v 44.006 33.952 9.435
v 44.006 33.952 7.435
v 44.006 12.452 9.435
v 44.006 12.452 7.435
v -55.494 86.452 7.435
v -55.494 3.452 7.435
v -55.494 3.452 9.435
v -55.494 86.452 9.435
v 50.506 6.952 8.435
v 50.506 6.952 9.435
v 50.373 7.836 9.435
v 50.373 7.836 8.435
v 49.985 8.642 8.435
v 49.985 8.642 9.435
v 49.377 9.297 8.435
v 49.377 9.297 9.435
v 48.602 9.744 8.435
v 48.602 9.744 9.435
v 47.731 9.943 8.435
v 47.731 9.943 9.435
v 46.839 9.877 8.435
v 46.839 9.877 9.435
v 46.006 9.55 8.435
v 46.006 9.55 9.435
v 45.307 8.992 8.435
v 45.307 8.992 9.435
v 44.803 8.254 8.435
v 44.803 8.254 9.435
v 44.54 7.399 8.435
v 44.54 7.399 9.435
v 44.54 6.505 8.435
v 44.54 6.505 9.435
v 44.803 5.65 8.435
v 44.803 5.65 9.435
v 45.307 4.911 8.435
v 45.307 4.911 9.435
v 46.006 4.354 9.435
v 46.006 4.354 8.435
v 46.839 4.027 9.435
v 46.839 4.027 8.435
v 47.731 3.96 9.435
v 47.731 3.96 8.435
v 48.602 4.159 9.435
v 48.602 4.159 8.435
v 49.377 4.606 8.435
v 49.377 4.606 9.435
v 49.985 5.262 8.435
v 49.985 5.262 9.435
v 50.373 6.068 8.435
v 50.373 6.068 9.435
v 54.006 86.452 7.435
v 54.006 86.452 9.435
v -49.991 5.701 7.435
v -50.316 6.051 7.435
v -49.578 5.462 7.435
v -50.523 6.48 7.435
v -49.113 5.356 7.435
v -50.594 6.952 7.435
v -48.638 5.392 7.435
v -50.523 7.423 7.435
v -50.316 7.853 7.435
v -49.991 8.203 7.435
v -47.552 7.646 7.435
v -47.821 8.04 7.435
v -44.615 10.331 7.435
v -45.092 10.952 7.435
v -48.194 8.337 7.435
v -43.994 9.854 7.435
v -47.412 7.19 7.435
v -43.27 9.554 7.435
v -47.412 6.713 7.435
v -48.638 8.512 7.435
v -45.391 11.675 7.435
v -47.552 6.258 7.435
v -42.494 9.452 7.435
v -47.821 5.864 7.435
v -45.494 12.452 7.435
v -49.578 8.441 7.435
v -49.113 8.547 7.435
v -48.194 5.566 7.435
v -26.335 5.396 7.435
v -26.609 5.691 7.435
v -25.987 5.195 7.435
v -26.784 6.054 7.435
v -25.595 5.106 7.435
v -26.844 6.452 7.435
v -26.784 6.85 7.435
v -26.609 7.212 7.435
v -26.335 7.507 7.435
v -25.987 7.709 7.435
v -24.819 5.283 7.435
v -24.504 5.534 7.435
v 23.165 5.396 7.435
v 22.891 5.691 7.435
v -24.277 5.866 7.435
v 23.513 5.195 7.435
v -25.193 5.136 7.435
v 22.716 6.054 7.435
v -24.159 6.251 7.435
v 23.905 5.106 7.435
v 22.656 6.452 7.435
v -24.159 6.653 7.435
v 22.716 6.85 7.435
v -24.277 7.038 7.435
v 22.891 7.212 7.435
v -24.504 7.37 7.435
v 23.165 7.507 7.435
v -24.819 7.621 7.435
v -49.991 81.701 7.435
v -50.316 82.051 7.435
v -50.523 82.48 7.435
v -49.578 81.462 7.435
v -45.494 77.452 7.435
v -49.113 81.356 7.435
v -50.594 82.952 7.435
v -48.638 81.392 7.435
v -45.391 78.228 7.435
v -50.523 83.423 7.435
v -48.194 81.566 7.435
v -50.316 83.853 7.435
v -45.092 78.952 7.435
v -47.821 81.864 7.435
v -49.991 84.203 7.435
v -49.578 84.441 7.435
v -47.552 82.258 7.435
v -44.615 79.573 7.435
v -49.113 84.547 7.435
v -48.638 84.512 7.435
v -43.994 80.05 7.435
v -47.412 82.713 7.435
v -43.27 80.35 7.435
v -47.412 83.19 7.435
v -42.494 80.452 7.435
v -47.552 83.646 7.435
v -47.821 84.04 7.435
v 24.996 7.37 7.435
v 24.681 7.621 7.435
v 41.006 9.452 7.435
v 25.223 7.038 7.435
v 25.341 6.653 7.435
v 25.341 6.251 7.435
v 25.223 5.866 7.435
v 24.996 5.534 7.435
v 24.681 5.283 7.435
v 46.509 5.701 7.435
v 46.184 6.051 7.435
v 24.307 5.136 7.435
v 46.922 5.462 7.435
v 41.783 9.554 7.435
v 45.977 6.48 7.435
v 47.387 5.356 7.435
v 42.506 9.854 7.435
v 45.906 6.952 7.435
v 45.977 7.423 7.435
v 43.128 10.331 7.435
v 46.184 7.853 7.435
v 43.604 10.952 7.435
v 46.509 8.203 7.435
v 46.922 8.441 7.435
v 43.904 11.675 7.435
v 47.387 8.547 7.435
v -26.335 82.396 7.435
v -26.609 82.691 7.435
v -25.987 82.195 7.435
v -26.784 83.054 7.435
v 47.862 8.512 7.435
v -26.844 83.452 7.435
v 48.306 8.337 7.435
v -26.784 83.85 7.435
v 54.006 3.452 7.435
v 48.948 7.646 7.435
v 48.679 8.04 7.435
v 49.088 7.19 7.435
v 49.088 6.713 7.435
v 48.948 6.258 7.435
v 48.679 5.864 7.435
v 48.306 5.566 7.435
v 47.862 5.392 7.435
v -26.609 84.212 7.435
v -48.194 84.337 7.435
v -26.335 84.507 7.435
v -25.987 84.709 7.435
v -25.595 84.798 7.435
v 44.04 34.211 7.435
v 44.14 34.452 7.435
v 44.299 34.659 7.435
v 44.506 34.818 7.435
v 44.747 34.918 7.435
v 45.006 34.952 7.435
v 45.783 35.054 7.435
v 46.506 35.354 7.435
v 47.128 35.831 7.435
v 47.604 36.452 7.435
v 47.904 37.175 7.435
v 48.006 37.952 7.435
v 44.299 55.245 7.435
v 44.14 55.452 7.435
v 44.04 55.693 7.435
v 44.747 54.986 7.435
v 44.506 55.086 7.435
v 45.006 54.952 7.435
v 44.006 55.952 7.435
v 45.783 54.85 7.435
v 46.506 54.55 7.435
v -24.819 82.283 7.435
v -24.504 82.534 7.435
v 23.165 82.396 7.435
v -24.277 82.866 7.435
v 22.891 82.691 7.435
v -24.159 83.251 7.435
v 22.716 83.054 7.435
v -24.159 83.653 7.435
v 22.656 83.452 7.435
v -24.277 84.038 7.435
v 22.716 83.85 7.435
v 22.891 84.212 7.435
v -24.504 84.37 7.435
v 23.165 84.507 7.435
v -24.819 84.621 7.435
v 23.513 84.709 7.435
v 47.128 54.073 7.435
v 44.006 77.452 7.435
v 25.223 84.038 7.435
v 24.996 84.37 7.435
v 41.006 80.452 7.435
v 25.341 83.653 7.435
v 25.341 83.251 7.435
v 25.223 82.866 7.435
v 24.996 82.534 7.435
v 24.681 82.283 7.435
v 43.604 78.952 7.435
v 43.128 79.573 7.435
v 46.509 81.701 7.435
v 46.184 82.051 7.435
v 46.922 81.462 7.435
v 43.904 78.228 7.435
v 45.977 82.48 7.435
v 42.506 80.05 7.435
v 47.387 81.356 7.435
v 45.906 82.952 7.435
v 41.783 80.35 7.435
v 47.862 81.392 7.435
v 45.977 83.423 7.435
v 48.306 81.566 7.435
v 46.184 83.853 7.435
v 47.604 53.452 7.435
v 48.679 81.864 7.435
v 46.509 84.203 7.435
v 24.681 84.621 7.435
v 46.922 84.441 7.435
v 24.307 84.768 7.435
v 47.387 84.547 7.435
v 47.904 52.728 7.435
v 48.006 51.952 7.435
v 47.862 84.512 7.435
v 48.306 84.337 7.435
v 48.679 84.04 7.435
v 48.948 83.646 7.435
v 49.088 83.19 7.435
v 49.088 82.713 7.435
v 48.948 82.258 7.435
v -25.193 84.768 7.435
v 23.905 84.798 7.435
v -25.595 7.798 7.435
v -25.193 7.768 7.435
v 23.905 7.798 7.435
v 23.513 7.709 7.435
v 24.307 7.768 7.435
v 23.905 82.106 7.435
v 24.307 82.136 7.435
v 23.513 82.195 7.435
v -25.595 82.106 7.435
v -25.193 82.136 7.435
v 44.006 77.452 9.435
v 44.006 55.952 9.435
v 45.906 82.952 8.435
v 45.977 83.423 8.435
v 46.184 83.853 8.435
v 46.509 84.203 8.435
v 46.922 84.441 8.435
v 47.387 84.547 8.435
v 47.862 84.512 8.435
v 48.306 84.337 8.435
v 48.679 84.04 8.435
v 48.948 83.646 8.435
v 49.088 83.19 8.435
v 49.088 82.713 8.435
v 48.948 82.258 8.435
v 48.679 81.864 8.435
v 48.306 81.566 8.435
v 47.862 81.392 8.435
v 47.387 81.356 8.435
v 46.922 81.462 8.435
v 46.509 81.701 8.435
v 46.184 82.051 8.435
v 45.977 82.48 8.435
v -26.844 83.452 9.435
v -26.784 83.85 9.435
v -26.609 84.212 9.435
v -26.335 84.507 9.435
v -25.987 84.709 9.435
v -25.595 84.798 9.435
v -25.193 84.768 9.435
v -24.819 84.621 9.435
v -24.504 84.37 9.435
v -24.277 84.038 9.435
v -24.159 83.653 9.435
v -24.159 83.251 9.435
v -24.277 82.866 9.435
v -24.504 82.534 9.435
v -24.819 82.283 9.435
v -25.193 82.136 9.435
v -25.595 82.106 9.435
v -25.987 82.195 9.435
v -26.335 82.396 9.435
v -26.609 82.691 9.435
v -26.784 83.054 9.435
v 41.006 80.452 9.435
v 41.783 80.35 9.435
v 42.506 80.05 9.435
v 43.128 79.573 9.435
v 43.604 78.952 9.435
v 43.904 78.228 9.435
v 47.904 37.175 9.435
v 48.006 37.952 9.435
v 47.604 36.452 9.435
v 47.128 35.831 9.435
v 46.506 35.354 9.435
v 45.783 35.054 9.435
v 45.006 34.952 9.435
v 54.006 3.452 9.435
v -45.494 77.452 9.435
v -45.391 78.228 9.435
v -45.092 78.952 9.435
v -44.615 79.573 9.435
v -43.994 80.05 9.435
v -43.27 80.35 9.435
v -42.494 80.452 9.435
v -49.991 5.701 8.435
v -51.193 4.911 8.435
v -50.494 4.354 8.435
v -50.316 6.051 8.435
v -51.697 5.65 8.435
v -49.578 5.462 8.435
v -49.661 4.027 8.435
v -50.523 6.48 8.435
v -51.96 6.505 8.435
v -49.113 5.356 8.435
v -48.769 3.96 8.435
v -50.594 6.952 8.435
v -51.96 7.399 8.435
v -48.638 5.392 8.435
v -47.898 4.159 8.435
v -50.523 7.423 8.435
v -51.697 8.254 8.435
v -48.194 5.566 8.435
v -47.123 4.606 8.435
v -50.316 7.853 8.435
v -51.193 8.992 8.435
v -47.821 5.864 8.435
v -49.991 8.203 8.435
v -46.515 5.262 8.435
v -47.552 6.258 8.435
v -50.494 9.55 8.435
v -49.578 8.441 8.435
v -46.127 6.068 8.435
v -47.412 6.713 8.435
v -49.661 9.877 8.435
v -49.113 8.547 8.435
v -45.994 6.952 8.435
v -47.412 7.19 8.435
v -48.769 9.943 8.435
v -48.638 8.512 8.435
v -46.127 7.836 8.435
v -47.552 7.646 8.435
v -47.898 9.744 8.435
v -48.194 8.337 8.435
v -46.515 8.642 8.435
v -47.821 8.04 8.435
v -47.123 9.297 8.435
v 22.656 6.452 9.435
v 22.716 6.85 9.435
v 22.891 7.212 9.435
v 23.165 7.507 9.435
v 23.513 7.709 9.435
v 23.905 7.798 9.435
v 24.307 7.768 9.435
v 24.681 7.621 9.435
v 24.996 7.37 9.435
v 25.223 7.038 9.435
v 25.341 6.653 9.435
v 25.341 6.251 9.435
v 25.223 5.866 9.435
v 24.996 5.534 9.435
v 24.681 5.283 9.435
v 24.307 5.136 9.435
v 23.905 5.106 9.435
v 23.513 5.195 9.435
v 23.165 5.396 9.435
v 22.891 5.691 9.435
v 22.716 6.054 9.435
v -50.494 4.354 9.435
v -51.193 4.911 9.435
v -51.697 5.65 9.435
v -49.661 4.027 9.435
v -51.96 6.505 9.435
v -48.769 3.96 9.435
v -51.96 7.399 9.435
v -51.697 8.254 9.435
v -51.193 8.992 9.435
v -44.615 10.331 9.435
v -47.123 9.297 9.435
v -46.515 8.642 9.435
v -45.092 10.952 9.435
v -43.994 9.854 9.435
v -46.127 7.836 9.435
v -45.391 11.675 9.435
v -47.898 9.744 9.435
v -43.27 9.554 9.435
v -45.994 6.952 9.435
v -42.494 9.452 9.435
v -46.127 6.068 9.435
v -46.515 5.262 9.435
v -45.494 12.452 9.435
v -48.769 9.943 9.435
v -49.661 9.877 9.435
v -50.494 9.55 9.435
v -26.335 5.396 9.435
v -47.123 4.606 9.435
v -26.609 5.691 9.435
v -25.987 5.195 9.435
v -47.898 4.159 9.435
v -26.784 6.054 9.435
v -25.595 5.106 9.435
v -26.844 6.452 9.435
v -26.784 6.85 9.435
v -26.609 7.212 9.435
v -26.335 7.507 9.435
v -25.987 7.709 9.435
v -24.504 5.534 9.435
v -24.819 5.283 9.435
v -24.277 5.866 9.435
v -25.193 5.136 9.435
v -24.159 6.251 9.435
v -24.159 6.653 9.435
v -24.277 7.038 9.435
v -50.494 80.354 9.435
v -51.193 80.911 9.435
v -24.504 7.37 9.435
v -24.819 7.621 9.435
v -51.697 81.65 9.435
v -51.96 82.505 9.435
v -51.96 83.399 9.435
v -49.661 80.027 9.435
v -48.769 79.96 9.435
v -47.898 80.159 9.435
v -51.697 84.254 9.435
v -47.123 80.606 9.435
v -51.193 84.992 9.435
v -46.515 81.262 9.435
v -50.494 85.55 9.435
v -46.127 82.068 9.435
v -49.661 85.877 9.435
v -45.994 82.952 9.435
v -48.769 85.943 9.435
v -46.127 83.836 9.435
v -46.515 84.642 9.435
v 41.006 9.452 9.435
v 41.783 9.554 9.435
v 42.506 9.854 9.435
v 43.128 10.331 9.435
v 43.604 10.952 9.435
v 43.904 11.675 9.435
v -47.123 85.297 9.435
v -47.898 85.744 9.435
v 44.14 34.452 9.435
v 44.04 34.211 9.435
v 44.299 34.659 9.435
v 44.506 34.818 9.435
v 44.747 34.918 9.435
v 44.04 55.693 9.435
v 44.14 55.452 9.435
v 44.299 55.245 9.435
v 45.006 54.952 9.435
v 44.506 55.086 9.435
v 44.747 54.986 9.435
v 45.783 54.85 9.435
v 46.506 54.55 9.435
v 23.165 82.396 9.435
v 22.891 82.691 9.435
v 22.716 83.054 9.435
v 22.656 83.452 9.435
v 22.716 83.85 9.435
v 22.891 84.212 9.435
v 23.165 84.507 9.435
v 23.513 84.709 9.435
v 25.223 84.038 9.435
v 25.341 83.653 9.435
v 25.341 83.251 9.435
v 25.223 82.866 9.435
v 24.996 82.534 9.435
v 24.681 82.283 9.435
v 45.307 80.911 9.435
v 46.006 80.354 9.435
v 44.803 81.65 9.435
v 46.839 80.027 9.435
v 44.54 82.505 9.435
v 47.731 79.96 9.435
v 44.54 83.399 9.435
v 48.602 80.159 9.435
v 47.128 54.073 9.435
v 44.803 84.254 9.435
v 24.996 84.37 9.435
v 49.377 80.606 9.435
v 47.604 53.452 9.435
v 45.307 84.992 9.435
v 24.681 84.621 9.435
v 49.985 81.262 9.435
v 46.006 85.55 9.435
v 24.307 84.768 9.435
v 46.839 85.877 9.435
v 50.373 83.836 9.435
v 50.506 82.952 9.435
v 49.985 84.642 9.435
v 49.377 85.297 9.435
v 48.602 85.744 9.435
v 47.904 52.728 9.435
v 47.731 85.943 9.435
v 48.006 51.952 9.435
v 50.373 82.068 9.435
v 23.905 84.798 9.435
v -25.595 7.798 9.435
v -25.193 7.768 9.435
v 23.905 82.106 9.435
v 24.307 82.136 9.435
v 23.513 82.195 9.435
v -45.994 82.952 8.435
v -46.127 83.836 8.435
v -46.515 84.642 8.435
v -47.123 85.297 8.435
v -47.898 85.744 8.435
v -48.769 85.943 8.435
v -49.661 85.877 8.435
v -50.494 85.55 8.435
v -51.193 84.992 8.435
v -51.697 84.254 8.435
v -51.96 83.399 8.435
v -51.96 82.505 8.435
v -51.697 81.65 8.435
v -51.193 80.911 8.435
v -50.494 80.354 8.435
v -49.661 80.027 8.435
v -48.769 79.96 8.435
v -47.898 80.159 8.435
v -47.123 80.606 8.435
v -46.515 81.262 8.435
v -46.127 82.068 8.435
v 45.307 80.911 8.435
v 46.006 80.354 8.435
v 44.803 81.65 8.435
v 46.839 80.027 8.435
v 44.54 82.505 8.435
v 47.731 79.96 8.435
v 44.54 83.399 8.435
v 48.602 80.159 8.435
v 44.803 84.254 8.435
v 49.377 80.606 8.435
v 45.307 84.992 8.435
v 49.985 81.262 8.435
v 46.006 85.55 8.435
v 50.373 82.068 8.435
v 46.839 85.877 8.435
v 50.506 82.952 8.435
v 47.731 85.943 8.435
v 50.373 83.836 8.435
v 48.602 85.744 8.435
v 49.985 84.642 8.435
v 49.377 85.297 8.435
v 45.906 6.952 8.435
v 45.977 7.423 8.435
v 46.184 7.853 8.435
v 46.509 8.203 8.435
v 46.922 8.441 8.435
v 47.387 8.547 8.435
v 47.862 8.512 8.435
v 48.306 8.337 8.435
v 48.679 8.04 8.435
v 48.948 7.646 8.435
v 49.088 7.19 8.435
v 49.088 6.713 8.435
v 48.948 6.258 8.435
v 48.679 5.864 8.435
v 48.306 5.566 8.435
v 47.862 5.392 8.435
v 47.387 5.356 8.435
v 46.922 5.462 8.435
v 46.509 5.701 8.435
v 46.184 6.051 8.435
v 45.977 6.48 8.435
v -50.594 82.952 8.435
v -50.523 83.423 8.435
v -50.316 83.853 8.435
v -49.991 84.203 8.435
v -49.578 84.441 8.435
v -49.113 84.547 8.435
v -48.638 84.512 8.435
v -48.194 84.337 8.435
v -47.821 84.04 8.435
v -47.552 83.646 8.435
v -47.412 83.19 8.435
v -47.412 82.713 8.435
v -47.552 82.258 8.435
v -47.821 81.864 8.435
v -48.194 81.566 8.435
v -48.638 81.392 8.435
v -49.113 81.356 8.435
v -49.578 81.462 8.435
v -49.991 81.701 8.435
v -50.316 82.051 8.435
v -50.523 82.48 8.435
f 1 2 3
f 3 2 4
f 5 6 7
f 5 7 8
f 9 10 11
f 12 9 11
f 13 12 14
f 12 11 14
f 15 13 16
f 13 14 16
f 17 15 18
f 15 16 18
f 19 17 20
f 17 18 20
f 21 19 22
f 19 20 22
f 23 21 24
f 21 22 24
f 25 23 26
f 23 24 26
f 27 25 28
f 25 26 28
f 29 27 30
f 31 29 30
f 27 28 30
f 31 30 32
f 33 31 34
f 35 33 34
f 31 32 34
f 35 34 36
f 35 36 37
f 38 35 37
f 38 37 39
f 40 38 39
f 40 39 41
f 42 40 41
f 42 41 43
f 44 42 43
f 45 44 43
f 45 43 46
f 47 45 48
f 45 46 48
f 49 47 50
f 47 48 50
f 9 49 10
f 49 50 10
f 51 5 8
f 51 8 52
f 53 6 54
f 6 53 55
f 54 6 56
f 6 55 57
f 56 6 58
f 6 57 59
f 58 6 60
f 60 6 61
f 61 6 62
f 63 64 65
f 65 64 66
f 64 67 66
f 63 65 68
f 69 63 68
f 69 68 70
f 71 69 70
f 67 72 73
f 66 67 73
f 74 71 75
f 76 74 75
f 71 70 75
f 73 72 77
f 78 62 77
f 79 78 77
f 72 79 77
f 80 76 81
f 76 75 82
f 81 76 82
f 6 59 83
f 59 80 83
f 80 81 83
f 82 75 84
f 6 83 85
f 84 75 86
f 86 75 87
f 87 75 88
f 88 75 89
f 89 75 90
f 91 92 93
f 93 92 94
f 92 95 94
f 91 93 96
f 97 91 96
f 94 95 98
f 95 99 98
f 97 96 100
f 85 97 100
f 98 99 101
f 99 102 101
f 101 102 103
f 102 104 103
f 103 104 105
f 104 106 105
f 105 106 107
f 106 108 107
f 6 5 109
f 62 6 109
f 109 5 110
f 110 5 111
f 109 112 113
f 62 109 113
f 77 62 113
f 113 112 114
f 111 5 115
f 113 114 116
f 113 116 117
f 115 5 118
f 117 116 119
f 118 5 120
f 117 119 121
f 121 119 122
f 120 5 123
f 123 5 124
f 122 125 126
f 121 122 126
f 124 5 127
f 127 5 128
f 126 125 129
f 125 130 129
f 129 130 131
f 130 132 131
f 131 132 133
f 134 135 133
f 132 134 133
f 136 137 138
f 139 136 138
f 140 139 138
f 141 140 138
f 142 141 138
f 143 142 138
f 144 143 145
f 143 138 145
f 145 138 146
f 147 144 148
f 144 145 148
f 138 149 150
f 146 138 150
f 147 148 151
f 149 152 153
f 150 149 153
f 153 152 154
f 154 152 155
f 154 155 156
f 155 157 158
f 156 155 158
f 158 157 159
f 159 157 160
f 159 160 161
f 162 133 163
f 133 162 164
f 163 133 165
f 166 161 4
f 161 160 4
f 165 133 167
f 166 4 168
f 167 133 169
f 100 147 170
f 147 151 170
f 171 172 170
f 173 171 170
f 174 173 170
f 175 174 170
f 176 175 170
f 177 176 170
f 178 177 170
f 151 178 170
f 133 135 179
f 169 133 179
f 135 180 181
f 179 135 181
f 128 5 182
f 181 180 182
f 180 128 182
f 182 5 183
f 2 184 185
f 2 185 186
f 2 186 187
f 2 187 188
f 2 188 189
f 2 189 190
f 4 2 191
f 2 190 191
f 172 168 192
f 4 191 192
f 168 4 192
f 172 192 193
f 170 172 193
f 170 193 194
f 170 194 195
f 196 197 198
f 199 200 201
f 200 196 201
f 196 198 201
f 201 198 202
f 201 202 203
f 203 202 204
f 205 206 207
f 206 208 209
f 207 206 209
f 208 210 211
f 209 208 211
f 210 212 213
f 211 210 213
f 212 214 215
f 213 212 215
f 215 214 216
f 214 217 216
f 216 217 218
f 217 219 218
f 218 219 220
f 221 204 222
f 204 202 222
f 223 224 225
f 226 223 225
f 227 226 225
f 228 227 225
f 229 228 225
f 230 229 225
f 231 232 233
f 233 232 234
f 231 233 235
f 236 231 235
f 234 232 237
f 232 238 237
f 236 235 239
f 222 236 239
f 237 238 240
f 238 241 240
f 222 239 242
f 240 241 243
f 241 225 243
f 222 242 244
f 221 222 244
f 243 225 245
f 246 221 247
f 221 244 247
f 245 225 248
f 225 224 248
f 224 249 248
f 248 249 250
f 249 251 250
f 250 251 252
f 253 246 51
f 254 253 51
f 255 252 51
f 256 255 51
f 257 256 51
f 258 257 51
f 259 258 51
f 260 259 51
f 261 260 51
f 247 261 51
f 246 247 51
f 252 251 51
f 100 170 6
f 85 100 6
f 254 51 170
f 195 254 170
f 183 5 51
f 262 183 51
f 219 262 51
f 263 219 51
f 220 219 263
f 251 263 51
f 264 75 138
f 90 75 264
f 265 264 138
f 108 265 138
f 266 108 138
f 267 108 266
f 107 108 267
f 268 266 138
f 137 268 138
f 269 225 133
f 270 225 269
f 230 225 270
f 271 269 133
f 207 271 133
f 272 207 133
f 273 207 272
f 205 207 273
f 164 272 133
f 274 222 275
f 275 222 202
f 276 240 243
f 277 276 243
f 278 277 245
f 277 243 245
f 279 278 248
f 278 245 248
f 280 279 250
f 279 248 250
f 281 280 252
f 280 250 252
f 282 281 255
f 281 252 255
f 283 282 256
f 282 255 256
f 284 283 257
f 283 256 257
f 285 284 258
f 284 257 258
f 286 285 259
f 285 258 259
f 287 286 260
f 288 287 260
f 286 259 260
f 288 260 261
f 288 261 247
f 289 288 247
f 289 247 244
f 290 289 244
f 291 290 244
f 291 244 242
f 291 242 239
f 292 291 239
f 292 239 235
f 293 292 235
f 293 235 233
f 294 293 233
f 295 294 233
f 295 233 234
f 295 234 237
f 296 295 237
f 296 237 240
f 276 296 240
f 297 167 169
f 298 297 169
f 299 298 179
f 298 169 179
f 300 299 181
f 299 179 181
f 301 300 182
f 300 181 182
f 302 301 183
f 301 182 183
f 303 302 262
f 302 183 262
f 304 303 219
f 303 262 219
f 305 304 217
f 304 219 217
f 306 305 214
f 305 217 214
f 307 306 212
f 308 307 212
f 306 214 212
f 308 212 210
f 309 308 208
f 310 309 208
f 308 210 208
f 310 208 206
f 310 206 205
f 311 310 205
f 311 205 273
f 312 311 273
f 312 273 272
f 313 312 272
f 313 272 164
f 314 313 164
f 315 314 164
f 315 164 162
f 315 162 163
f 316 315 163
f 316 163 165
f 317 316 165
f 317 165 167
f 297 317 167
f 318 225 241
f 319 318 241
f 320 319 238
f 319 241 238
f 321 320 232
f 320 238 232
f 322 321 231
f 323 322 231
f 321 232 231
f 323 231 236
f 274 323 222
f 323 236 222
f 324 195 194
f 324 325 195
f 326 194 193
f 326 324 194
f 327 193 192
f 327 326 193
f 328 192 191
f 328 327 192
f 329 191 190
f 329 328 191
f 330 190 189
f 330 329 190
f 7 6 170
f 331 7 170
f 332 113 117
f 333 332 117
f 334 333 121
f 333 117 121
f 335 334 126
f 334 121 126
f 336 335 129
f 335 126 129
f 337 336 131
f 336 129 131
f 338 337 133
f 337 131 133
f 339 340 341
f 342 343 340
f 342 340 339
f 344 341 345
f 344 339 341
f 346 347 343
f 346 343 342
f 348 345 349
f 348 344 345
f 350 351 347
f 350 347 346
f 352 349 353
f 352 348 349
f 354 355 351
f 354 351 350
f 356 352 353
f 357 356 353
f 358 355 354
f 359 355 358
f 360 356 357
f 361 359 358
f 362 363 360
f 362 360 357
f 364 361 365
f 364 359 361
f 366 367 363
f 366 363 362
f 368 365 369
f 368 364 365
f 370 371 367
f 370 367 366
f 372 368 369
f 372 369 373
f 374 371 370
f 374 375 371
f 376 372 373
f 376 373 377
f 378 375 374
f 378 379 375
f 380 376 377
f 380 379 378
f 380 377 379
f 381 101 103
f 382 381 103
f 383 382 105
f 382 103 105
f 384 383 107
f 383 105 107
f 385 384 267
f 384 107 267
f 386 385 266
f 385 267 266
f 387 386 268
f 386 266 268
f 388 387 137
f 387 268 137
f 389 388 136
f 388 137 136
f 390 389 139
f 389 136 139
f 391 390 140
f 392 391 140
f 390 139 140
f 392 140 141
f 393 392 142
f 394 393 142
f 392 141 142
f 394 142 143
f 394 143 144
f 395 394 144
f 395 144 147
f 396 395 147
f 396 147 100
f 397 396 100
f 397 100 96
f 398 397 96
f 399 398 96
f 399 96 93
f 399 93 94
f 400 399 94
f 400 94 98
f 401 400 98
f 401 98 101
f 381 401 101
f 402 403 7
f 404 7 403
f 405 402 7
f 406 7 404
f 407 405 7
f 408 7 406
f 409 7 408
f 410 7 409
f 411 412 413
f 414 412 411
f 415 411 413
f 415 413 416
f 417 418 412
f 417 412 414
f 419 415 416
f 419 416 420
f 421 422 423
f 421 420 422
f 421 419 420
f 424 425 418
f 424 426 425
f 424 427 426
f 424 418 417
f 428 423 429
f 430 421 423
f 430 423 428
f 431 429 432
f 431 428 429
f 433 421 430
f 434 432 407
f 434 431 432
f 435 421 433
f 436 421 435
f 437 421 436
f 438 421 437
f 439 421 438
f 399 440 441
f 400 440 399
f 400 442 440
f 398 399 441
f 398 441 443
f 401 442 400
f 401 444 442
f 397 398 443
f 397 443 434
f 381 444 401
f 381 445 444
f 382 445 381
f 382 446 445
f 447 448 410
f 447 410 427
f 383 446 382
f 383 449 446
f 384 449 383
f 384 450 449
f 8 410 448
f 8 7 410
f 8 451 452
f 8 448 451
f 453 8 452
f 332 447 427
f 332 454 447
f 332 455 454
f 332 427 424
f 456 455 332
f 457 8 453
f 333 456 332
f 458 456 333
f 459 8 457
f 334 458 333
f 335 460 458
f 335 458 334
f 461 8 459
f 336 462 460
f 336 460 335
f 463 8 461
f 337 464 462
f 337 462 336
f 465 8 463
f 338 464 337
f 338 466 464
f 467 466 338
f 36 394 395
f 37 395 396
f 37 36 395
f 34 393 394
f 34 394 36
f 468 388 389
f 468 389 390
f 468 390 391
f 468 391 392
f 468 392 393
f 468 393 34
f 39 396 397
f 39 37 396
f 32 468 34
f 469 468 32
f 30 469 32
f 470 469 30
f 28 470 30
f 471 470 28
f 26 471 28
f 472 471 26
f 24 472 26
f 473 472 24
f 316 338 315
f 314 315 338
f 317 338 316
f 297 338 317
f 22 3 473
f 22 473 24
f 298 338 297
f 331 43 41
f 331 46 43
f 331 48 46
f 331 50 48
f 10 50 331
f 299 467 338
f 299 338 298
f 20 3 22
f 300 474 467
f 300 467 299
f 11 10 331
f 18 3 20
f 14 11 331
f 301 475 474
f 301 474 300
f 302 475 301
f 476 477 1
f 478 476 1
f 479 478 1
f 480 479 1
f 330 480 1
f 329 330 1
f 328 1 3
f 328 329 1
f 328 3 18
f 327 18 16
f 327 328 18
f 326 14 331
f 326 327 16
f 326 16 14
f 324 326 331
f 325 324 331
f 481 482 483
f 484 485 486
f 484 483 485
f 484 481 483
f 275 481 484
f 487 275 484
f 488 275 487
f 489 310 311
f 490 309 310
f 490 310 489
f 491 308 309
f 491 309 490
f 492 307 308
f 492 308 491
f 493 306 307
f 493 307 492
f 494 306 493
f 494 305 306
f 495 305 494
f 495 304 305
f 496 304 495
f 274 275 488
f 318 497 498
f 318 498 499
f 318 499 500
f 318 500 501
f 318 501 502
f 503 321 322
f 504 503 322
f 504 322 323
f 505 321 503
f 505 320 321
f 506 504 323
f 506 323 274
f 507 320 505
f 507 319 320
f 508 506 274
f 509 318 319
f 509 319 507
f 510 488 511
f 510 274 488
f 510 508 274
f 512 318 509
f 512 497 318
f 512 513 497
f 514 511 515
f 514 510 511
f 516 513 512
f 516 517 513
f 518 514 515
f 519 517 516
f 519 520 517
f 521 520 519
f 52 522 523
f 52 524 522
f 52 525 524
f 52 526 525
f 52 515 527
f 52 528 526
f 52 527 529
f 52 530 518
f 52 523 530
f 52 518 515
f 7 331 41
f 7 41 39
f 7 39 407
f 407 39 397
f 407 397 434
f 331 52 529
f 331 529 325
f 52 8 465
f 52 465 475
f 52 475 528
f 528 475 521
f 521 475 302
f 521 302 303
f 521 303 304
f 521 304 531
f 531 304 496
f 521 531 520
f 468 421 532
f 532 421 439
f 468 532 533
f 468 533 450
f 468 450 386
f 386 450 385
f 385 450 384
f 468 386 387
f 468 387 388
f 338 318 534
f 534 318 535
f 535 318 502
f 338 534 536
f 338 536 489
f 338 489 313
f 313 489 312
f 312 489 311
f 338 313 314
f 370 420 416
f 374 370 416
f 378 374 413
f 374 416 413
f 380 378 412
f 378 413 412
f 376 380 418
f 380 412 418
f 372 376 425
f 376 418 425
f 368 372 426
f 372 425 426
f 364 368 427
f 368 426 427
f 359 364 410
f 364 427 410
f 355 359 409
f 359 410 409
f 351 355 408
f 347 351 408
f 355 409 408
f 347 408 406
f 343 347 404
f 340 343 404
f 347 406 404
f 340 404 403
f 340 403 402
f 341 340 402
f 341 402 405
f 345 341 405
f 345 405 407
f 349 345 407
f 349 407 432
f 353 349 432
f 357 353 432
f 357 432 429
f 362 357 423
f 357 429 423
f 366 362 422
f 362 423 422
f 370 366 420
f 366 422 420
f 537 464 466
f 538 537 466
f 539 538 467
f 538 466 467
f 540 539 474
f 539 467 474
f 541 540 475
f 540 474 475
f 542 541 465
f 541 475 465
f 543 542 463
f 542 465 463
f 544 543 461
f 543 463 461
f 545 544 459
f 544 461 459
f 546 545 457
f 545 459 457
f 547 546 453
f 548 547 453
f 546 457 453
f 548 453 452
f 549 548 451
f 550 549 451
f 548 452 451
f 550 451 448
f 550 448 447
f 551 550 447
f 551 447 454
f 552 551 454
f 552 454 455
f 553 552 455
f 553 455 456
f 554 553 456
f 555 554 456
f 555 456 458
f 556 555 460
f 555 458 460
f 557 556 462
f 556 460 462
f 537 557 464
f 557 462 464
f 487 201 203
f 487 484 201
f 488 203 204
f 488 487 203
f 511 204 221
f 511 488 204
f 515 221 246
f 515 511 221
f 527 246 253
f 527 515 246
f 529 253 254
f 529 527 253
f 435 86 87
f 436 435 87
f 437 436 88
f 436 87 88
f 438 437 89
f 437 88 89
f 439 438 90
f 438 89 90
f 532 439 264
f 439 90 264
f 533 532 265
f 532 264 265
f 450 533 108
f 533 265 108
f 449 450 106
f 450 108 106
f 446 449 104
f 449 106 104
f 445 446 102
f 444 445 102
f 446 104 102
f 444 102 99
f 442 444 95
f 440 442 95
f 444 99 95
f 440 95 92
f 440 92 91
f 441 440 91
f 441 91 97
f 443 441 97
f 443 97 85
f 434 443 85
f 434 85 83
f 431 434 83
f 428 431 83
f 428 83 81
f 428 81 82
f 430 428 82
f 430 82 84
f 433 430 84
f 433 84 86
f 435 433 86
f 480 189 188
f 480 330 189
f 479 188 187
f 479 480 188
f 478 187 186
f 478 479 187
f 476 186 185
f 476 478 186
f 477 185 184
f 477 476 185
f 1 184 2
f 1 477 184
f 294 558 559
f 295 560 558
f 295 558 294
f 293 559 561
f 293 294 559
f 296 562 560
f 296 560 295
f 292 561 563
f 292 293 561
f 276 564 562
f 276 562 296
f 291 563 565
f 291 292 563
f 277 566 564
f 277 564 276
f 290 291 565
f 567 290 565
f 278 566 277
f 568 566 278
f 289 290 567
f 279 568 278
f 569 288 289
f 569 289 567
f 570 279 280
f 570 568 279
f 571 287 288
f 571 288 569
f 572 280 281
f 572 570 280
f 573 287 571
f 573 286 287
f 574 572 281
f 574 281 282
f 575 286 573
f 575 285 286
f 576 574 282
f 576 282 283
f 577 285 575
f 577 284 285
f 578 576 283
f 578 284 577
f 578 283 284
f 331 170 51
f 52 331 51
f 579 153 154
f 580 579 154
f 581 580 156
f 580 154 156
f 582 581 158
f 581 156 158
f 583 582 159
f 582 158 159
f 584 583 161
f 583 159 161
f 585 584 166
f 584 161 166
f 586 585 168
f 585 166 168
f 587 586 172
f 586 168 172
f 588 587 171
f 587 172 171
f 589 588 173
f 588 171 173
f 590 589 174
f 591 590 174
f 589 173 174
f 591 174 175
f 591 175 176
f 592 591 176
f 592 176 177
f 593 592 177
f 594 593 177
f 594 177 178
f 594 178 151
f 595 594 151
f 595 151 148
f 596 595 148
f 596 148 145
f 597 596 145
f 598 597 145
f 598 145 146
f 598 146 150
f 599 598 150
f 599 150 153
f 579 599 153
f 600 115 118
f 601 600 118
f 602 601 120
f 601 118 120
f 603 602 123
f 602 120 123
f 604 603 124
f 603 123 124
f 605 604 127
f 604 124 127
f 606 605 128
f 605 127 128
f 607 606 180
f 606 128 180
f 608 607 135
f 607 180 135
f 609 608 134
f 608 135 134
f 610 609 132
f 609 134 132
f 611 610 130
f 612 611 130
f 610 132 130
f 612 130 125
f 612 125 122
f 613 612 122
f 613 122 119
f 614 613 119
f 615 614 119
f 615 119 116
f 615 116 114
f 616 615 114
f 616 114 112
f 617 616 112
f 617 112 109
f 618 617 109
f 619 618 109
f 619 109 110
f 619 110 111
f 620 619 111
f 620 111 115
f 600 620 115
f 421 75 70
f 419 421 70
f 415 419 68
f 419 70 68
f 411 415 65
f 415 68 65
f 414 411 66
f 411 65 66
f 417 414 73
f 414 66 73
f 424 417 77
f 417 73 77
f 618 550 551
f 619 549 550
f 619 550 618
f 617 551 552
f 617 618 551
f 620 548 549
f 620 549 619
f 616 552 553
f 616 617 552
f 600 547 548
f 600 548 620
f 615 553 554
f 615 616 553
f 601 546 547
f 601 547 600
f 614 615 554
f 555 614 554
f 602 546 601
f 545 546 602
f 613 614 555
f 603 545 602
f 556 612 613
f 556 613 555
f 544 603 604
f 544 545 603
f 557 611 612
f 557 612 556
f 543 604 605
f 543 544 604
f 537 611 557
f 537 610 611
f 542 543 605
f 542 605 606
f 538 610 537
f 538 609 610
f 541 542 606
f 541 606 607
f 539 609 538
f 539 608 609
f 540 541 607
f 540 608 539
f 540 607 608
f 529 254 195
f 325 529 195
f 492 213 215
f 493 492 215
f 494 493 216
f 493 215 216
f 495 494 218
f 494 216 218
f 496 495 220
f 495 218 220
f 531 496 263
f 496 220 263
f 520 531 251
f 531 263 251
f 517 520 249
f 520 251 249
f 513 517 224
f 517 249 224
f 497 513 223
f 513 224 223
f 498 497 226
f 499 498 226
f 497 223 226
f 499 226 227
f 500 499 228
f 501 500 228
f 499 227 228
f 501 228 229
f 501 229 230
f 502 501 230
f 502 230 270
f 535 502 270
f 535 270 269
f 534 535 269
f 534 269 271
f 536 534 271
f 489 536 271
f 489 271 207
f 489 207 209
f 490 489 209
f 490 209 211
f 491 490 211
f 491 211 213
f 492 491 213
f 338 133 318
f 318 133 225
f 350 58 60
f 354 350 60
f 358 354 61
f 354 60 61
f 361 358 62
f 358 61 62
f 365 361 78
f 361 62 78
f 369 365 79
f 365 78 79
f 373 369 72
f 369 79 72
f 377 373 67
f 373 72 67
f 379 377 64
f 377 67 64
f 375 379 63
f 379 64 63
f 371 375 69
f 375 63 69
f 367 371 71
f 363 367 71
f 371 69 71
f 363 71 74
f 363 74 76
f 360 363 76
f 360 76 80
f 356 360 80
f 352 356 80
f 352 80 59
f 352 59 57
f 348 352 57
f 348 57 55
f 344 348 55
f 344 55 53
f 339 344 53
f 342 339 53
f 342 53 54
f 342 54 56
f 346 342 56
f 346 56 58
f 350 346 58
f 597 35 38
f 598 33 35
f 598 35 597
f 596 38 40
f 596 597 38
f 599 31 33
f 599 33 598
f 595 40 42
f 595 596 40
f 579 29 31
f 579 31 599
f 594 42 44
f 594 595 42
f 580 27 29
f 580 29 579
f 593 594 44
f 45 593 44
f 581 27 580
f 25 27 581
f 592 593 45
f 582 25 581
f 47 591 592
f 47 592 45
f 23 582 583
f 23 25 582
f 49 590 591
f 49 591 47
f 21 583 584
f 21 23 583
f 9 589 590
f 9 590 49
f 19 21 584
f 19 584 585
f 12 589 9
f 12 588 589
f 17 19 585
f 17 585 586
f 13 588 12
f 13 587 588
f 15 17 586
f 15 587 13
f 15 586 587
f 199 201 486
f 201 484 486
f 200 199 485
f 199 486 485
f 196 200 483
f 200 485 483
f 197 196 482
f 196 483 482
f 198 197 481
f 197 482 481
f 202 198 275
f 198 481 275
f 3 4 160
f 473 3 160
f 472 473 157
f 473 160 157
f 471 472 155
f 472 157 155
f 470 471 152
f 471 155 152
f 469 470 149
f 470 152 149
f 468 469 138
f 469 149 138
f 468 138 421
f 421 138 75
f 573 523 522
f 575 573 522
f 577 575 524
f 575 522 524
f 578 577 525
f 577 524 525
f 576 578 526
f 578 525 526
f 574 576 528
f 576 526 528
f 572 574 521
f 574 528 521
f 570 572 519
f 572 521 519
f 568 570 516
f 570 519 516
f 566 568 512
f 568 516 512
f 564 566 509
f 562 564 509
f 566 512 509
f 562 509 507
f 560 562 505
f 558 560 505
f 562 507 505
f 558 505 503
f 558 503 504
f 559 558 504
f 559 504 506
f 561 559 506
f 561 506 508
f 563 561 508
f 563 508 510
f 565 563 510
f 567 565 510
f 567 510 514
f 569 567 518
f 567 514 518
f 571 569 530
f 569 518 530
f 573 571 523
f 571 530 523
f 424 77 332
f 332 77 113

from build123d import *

# Parameters (mm, degrees)
SKETCH1_W                  = 109.5
SKETCH1_H                  = 83
BOSS_EXTRUDE1_DEPTH        = 2
F_3_2_3_2_DIAMETER_HOLE1_D = 3.2
F_2_7_2_7_DIAMETER_HOLE1_D = 2.7
SKETCH12_R                 = 3
CUT_EXTRUDE1_DEPTH         = 1
FILLET1_R                  = 3
FILLET2_R                  = 1


with BuildPart() as part:
    # Sketch1 → Boss-Extrude1 (new body)
    with BuildSketch(Plane.XY.offset(7.43465612)):
        with Locations((-0.743641502, 44.95185693)):
            Rectangle(SKETCH1_W, SKETCH1_H)
        with BuildLine():
            Line((-42.493641502, 80.45185693), (41.006358498, 80.45185693))
            ThreePointArc((41.006358498, 80.45185693), (43.127678842, 79.573177274), (44.006358498, 77.45185693))
            Line((44.006358498, 77.45185693), (44.006358498, 54.95185693))
            Line((44.006358498, 54.95185693), (48.006358498, 54.95185693))
            Line((48.006358498, 54.95185693), (48.006358498, 44.95185693))
            Line((48.006358498, 44.95185693), (48.006358498, 34.95185693))
            Line((48.006358498, 34.95185693), (44.006358498, 34.95185693))
            Line((44.006358498, 34.95185693), (44.006358498, 12.45185693))
            ThreePointArc((44.006358498, 12.45185693), (43.127678842, 10.330536587), (41.006358498, 9.45185693))
            Line((41.006358498, 9.45185693), (-42.493641502, 9.45185693))
            ThreePointArc((-42.493641502, 9.45185693), (-44.614961845, 10.330536587), (-45.493641502, 12.45185693))
            Line((-45.493641502, 12.45185693), (-45.493641502, 77.45185693))
            ThreePointArc((-45.493641502, 77.45185693), (-44.614961845, 79.573177274), (-42.493641502, 80.45185693))
        make_face(mode=Mode.SUBTRACT)
    extrude(amount=BOSS_EXTRUDE1_DEPTH)

    # Ø3.2 (3.2) Diameter Hole1 (through all)
    with Locations(Plane.XY.offset(9.43465612)):
        with Locations((-48.993641502, 6.95185693), (-48.993641502, 82.95185693), (47.506358498, 82.95185693), (47.506358498, 6.95185693)):
            Hole(F_3_2_3_2_DIAMETER_HOLE1_D / 2)

    # Ø2.7 (2.7) Diameter Hole1 (through all)
    with Locations(Plane(origin=(-25.493641502, 83.45185693, 9.43465612), x_dir=(1, 0, 0), z_dir=(0, 0, 1))):
        with Locations((0, 0), (49.5, 0), (49.5, -77), (0, -77)):
            Hole(F_2_7_2_7_DIAMETER_HOLE1_D / 2)

    # Sketch12 → Cut-Extrude1 (cut)
    with BuildSketch(Plane.XY.offset(9.43465612)):
        with Locations((-48.993641502, 82.95185693)):
            Circle(SKETCH12_R)
        with Locations((47.506358498, 82.95185693)):
            Circle(SKETCH12_R)
        with Locations((47.506358498, 6.95185693)):
            Circle(SKETCH12_R)
        with Locations((-48.993641502, 6.95185693)):
            Circle(SKETCH12_R)
    extrude(amount=-CUT_EXTRUDE1_DEPTH, mode=Mode.SUBTRACT)

    # Fillet1
    fillet1_edges = [part.edges().sort_by_distance(p)[0] for p in [
        (48.006358498, 34.95185693, 8.43465612),
        (48.006358498, 54.95185693, 8.43465612),
    ]]
    fillet(fillet1_edges, radius=FILLET1_R)

    # Fillet2
    fillet2_edges = [part.edges().sort_by_distance(p)[0] for p in [
        (44.006358498, 34.95185693, 8.43465612),
        (44.006358498, 54.95185693, 8.43465612),
    ]]
    fillet(fillet2_edges, radius=FILLET2_R - 0.0001)  # a hair under: the kernel refuses the full size


solid = part.part
